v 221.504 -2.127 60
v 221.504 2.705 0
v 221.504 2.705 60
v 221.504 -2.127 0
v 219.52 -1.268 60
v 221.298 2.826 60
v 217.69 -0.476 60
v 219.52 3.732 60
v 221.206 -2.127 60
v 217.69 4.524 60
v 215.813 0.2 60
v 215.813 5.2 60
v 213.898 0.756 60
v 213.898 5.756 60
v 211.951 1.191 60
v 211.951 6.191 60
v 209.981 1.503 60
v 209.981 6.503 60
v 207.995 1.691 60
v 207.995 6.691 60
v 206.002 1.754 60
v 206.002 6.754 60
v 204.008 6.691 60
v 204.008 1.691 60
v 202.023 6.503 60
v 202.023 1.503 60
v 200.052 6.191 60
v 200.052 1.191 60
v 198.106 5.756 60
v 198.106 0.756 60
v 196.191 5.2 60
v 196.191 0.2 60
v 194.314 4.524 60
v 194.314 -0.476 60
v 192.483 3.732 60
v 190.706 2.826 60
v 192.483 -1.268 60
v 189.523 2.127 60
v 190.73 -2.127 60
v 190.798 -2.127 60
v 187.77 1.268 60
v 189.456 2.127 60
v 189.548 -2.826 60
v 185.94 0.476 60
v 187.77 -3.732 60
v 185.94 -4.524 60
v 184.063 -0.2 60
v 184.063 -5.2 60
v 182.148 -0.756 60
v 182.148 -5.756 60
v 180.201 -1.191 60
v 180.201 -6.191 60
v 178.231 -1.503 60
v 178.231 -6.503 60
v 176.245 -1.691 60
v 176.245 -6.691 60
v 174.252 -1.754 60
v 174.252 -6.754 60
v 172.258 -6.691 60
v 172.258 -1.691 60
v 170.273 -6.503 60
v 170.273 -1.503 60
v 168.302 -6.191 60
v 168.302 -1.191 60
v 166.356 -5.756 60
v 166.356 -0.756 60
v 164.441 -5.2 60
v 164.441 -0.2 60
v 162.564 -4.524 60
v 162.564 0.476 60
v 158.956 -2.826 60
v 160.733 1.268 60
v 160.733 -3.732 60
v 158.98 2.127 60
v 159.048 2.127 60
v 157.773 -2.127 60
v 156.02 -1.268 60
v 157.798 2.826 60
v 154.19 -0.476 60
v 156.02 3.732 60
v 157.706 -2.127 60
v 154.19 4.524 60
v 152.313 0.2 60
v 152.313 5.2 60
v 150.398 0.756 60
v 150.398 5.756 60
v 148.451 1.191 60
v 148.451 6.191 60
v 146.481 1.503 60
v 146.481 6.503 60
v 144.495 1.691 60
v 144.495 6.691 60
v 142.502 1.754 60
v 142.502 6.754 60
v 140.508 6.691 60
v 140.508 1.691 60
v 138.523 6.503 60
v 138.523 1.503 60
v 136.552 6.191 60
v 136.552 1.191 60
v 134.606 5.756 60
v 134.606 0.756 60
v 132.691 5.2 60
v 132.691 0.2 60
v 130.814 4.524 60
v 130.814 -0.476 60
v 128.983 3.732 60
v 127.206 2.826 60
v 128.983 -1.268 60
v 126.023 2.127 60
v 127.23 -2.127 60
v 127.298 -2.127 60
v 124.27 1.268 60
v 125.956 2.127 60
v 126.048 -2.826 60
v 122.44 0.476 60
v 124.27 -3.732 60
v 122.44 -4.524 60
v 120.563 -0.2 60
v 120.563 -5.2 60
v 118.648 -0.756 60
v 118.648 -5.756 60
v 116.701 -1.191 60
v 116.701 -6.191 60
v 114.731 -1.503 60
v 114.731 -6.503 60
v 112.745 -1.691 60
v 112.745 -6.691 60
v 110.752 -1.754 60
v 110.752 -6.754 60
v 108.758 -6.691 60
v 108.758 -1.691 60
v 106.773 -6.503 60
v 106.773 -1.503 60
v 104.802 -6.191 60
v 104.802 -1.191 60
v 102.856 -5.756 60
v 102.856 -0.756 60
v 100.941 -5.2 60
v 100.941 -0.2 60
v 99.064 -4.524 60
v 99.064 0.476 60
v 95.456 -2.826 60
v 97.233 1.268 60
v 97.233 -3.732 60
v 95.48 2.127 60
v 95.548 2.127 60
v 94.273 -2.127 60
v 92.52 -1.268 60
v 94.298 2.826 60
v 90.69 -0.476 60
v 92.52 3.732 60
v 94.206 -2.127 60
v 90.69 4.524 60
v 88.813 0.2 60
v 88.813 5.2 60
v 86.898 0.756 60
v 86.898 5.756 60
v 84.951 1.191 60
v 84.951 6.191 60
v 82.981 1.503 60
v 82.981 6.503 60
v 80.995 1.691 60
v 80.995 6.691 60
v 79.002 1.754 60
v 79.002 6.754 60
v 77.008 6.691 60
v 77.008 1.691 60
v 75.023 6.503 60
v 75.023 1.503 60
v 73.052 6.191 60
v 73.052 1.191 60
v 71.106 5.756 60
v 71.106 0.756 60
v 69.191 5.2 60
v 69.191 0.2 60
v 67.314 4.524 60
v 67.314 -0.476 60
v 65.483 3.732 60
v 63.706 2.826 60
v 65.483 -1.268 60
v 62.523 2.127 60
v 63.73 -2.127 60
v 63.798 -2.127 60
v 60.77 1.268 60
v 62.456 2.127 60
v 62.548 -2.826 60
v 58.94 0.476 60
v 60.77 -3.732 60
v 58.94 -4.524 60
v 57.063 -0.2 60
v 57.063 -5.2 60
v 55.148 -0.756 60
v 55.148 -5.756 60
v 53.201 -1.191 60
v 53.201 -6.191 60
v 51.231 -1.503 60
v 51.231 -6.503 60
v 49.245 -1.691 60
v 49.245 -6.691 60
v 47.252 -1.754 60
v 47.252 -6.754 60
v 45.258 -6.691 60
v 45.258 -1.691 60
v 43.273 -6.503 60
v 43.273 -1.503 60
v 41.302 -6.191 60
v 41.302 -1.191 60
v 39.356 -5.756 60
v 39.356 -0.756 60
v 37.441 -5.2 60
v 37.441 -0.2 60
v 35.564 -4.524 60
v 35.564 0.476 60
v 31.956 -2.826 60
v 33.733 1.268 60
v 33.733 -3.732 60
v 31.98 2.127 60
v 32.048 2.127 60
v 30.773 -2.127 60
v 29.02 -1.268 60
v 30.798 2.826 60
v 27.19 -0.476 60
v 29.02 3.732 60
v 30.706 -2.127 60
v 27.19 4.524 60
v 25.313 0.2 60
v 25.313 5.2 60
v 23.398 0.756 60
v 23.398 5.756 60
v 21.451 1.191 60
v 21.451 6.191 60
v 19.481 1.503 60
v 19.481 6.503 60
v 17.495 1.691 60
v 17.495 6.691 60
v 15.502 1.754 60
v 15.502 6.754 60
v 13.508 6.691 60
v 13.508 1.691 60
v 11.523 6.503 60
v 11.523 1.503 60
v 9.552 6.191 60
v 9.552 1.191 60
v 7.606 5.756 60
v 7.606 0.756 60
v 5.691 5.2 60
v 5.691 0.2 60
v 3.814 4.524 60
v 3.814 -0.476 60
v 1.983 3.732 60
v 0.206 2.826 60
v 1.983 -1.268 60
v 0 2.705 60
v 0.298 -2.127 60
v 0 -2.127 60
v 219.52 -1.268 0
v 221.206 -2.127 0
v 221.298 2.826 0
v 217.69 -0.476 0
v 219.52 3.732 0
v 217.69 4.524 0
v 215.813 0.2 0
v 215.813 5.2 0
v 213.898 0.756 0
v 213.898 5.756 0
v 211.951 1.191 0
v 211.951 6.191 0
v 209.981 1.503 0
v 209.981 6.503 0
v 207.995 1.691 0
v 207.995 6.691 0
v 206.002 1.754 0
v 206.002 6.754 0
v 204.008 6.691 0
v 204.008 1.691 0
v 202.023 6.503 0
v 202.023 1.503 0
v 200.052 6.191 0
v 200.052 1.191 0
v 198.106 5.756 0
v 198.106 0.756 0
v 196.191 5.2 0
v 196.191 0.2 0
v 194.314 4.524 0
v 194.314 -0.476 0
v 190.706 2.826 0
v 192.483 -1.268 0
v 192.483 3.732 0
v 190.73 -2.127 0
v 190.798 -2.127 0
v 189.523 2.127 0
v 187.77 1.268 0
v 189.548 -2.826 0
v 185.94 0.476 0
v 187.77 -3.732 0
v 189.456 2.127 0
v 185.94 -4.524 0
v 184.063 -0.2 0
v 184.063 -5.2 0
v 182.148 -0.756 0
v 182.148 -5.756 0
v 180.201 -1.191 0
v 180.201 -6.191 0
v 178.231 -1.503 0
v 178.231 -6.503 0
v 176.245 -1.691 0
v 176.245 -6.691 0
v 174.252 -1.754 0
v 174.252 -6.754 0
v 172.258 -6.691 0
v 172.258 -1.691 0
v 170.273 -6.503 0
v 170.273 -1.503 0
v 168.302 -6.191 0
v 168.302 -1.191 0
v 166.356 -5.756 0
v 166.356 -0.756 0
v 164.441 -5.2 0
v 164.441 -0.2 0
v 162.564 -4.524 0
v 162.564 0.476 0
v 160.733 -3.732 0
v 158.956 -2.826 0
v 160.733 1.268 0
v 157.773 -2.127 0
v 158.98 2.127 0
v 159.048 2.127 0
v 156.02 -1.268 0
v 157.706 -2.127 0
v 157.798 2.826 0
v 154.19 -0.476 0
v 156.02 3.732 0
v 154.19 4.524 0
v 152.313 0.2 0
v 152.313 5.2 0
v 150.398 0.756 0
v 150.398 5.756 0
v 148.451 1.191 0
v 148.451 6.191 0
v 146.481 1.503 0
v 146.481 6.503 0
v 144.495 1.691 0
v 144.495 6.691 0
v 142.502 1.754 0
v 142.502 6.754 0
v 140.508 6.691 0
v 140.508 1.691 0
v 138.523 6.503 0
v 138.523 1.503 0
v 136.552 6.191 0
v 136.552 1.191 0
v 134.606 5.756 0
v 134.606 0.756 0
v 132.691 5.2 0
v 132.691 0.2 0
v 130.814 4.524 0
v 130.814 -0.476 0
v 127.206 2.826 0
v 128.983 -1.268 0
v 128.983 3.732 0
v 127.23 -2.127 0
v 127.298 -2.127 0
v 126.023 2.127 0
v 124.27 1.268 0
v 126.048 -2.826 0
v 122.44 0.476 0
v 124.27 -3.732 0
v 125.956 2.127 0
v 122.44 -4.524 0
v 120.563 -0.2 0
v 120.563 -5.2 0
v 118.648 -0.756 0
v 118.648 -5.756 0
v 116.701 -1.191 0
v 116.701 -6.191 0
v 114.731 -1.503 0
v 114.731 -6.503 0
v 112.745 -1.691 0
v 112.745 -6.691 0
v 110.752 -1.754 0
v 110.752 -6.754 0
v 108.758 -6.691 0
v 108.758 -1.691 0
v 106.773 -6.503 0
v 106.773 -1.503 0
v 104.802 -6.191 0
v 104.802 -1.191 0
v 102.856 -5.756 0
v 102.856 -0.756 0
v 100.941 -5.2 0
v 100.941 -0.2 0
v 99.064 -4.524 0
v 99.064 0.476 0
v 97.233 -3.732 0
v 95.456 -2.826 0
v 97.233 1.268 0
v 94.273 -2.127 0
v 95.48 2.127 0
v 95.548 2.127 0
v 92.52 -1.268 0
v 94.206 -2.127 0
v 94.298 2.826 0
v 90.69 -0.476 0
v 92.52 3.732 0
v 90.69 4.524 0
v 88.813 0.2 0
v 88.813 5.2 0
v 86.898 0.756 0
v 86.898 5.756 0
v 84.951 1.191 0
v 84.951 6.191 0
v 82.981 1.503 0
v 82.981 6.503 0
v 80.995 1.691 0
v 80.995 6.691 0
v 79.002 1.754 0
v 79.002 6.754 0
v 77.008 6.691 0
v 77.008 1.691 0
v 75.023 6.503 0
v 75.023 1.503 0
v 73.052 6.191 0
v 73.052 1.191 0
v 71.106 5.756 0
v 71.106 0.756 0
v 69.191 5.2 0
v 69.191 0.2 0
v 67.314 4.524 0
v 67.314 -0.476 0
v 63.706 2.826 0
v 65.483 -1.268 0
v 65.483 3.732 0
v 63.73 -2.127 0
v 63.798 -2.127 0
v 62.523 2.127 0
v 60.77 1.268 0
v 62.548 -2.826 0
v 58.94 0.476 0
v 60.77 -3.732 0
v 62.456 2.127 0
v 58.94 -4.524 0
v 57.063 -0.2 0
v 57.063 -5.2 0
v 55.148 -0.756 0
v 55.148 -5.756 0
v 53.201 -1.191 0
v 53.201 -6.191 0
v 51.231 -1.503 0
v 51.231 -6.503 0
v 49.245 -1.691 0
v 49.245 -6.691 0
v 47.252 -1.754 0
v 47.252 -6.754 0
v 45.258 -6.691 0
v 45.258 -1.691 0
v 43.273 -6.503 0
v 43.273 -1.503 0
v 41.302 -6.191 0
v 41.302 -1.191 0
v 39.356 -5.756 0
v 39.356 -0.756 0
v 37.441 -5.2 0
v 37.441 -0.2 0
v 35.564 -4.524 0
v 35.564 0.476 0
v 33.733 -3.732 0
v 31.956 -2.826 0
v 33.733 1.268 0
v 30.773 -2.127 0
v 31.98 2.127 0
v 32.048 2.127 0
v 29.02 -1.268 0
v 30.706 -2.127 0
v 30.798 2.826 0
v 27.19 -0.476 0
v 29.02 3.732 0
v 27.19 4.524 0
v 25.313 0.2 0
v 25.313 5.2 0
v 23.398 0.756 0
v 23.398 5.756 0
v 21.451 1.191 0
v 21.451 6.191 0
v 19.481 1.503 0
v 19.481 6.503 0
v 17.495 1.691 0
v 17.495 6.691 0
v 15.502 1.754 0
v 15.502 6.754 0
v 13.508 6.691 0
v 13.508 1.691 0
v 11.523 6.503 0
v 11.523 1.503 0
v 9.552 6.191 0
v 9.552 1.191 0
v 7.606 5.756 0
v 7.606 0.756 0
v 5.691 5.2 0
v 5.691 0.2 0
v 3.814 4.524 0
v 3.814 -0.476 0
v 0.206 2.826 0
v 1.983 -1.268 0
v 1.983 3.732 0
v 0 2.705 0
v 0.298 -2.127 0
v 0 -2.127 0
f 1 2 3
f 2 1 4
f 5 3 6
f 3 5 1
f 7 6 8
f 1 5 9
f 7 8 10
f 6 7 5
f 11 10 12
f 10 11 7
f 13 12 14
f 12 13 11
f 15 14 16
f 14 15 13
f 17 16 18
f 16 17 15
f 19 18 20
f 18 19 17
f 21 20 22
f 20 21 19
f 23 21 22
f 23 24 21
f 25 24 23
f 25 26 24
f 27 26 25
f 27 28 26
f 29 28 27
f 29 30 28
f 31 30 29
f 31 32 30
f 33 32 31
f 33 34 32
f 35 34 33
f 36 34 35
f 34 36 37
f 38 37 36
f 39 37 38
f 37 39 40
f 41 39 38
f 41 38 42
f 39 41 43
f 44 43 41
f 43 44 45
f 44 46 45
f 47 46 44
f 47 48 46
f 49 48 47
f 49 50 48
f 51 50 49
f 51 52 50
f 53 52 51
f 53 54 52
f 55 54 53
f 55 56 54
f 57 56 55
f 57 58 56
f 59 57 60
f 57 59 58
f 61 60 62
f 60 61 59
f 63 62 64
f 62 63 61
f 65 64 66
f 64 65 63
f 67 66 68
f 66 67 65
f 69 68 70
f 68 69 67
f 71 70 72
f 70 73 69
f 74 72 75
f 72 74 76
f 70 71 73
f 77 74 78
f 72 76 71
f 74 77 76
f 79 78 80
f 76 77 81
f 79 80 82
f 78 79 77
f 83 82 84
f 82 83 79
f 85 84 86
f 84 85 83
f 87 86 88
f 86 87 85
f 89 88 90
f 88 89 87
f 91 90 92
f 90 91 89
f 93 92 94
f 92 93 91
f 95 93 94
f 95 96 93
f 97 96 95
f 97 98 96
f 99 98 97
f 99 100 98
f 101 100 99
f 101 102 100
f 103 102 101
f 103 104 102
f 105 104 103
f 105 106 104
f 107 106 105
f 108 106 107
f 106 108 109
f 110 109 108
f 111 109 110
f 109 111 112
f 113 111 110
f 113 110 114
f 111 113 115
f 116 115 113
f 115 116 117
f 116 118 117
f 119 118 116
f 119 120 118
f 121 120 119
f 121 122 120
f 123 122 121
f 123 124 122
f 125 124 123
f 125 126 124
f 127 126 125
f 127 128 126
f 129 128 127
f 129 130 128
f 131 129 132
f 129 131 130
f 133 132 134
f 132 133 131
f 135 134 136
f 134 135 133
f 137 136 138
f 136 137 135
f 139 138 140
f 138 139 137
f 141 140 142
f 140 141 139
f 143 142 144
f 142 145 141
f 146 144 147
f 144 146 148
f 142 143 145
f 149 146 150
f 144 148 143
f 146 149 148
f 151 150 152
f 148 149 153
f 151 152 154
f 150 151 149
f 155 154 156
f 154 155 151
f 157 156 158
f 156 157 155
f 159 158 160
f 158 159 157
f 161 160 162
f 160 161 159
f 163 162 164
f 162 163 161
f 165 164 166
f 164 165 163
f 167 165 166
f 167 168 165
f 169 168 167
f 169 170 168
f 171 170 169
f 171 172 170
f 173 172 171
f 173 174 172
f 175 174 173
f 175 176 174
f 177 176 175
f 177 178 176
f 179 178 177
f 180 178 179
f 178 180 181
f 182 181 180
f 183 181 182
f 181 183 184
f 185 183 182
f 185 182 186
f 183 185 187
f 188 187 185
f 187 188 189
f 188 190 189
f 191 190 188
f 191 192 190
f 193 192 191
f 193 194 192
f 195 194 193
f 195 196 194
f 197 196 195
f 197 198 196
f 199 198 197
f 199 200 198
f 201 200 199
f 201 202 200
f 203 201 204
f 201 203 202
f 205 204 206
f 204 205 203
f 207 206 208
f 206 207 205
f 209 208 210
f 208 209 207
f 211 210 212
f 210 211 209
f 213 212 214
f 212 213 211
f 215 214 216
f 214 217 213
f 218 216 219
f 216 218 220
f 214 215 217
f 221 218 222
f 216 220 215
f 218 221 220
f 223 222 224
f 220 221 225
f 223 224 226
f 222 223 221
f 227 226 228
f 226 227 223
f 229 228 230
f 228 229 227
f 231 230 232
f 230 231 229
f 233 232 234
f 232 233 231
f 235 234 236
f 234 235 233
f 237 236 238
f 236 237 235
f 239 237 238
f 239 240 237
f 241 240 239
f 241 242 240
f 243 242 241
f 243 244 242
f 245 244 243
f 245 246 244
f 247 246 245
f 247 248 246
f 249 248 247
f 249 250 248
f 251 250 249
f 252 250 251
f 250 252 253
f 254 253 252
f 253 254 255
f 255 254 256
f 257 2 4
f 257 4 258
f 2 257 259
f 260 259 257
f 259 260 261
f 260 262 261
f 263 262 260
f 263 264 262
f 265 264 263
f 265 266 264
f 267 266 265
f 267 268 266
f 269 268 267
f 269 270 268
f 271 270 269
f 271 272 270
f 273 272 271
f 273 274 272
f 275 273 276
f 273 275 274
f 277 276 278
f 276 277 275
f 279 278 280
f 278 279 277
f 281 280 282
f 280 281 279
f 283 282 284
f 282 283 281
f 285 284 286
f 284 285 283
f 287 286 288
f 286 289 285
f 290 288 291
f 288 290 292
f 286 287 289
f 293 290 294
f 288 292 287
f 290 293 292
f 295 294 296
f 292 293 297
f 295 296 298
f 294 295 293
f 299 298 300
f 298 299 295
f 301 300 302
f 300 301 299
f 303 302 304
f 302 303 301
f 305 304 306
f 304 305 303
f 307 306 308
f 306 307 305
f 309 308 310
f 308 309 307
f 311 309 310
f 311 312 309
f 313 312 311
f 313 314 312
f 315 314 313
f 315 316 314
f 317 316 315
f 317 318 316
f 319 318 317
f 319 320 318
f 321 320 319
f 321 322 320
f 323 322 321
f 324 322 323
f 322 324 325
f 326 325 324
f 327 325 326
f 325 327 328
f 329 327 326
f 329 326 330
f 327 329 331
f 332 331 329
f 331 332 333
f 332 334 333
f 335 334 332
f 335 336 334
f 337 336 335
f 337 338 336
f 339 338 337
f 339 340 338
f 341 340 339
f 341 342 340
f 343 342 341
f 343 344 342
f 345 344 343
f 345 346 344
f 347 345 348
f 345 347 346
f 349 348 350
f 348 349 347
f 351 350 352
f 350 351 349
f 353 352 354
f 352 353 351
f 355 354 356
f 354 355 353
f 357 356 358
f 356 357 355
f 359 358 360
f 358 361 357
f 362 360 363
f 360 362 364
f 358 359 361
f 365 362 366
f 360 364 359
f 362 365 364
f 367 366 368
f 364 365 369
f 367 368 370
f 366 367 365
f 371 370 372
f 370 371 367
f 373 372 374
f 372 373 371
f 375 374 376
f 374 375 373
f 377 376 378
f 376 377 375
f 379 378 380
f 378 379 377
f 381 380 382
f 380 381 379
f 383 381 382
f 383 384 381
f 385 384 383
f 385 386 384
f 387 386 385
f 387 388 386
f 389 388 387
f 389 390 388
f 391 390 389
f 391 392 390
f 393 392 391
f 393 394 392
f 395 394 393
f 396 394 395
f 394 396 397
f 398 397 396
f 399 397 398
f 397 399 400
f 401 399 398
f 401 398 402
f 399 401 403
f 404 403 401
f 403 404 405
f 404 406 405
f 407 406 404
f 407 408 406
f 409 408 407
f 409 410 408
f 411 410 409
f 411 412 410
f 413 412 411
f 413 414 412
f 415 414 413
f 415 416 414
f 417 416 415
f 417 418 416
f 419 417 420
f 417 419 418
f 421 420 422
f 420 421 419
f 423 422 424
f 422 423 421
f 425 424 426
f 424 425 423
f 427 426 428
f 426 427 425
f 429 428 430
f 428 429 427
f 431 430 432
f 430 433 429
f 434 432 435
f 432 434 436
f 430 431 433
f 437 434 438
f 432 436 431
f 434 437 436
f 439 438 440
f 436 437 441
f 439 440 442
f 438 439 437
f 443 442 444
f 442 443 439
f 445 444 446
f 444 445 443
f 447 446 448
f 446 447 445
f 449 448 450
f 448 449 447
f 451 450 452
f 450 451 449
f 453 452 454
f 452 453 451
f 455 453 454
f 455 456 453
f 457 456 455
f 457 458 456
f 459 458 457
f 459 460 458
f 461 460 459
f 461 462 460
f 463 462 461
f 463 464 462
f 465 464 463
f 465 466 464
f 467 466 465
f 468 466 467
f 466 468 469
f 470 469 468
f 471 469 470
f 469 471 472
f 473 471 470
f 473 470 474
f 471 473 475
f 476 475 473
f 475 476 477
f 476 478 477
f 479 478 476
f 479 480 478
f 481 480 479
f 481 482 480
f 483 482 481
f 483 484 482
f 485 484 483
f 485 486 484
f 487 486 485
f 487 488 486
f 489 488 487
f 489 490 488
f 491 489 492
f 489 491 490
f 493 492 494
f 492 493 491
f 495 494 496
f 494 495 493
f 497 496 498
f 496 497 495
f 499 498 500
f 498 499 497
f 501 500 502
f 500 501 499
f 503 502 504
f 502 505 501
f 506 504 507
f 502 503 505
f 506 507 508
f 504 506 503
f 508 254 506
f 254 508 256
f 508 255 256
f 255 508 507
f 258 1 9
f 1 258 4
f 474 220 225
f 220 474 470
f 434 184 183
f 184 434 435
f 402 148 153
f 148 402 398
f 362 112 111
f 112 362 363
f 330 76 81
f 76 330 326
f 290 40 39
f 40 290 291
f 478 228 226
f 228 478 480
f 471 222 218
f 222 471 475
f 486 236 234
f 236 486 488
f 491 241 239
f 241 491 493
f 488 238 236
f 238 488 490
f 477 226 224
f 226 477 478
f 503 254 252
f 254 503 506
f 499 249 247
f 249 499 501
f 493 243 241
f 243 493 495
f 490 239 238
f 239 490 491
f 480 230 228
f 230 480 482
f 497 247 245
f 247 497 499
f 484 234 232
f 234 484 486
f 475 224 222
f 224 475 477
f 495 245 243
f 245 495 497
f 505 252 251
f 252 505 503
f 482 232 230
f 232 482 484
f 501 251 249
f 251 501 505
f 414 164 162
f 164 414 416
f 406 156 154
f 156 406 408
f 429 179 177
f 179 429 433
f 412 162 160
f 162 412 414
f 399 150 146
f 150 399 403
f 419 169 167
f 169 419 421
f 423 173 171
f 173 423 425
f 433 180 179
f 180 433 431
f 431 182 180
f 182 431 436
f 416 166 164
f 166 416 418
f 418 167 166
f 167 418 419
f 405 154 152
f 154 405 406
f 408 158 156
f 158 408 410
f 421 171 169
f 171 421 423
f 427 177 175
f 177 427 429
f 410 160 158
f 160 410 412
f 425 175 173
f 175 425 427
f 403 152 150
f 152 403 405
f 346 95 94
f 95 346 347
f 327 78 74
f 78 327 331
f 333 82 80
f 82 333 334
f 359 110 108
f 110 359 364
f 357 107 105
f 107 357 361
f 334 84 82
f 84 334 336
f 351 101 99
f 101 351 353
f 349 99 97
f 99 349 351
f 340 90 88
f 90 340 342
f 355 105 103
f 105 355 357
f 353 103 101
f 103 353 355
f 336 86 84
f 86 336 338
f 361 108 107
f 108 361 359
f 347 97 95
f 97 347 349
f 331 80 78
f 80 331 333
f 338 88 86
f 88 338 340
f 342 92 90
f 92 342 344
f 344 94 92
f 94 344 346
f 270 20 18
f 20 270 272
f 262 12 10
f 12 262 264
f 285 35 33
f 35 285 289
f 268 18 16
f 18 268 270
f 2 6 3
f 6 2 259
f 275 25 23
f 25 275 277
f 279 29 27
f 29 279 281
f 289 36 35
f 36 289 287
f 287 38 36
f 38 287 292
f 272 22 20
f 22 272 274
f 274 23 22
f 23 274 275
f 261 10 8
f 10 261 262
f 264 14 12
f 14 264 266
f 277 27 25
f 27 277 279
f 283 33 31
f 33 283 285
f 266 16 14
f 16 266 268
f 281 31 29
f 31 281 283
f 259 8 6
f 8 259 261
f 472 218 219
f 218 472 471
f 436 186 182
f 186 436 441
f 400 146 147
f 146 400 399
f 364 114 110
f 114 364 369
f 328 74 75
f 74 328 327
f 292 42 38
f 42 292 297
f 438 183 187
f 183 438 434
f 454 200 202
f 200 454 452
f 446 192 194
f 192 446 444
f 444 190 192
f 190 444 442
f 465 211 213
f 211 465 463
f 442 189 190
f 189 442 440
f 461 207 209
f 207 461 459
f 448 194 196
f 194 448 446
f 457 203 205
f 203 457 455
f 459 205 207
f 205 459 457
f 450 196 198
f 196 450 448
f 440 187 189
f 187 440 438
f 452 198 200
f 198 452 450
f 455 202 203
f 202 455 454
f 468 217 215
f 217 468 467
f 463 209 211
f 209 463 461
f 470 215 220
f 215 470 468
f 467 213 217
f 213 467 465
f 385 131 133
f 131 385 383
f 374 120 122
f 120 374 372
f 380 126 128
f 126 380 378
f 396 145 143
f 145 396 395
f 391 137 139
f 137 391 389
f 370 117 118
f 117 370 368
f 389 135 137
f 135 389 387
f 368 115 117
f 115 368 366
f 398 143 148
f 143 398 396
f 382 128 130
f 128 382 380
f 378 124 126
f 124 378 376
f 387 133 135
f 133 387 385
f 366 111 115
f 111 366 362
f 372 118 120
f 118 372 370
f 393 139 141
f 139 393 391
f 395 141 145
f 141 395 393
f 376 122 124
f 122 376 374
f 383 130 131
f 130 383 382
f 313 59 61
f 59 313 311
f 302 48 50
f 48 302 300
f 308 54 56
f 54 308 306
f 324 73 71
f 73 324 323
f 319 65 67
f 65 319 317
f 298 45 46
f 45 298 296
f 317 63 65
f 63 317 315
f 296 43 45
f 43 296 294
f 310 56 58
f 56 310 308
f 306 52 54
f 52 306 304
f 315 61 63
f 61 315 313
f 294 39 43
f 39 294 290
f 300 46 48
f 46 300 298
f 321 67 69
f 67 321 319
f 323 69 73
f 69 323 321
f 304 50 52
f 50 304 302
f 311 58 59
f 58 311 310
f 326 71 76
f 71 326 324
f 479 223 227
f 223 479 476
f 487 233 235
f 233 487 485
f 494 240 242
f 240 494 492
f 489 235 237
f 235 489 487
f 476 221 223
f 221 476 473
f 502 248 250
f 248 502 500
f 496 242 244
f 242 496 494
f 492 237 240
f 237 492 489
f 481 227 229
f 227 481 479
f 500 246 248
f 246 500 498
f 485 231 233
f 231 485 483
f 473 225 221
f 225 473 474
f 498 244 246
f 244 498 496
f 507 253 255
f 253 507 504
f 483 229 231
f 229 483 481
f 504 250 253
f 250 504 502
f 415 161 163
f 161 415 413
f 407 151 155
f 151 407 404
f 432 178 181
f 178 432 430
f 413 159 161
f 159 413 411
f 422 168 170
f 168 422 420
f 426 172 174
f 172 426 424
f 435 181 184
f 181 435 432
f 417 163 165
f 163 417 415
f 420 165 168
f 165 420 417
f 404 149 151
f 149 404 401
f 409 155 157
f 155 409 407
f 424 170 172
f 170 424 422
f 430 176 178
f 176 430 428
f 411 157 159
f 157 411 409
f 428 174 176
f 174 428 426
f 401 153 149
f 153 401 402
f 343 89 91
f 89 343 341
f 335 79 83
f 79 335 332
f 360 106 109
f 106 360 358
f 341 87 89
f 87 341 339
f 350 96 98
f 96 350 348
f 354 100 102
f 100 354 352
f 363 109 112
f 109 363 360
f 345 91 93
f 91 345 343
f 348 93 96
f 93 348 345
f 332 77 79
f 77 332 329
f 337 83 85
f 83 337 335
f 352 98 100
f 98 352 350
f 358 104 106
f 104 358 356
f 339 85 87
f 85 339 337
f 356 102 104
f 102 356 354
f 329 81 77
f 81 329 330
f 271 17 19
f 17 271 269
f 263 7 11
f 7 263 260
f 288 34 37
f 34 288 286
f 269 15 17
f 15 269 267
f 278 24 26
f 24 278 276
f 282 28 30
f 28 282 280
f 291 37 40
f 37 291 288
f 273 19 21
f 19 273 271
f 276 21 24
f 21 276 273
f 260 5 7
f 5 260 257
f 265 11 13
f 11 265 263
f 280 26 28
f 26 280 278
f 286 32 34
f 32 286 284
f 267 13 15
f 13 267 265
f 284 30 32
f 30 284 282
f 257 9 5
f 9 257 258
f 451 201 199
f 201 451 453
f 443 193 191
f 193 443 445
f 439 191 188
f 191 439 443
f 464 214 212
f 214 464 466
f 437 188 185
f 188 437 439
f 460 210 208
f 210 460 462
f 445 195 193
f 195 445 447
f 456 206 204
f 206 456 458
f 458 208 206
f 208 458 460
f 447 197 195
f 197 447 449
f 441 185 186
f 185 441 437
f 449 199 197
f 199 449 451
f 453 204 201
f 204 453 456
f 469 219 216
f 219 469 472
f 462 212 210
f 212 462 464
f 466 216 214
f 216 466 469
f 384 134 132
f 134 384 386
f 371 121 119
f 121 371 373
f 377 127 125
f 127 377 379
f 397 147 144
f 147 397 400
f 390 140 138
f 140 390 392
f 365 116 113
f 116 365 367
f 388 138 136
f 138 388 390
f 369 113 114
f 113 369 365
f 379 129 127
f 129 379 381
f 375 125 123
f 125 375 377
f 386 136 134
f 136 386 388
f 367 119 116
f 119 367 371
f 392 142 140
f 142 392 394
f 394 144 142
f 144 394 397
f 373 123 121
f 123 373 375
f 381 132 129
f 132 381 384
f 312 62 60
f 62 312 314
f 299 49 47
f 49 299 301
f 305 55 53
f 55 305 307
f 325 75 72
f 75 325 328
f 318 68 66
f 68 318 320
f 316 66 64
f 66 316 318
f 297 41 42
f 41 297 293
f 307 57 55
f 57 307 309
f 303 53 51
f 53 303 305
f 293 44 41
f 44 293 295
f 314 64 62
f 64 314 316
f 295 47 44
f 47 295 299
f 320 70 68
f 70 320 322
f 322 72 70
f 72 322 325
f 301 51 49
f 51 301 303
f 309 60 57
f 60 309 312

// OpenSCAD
//Config values
/* [Layout] */
//How many cans fit on the bottom row
NumberOfCansOnBottom = 4;
//How thick should it be between the cans (in mm)
DividerThickness = 5;
//How deep should it be along the height of the can (in mm)
DividerDepth = 60;  //Full can height is 121.92


BetweenCanShape = 1; //[0:square edges, 1:smooth curve, 2:faceted curve]


/* [Details] */
//Some other can size? (in mm)
CanRadius = 31.75;





//######## Between Can Options
//VERSION0 is flat surfaces
VERSION0 = BetweenCanShape == 0;
//VERSION1 is smooth curves, same size as cans
VERSION1 = BetweenCanShape == 1;
//VERSION2 is faceted curves, same size as cans, see facetCurveCount to adjust
VERSION2 = BetweenCanShape == 2;
//#####End Between Can Options


//Height of square edges option
SquareEdgesHeight = 10;

//THESE OPTIONS WORK PRETTY WELL
//Faceted curve number
facetCurveCount = 18; //[10, 12, 18, 24]


//######## End Options

//Version 0 has edges that extend past the can
//Version 1 has edges that touch the can
ENDS_VERSION = 1;  //[0:extend past can, 1:edges stop at can]]
//#####End End Options


//###### applying option calculations
retainThickness = VERSION0 ? SquareEdgesHeight/2 : DividerThickness/2;
moveShitOver = [
			//Version 0:
			0,
			//Verison 1:
			VERSION0
				?	CanRadius-sqrt(((CanRadius-retainThickness)*(CanRadius-retainThickness))
					+(CanRadius*CanRadius))
				: -CanRadius * sin(60) / 2 - retainThickness
			];
width = NumberOfCansOnBottom * CanRadius * 2
				+ moveShitOver[ENDS_VERSION]*2;


/* [Smoothness] */
$fn = 100;
/* [Hidden] */
OVERLAP=0.1;

////Setup
//canCenters = [for (i = [0:NumberOfCansOnBottom])
//{
//	
//}
//];


CombineAll();

module CombineAll()
{
	difference()
	{
		//Positive
		union()
		{
			if (VERSION0) {
				MainPiece(SquareEdgesHeight);
			}


			if (VERSION1) {
				assign (offset = CanRadius * sin(60) / 2)
				{
				intersection()
				{
					translate(v=[0, offset, 0])
						MainPiece(CanRadius);
					AllCanShapes(-DividerThickness, bottom = false, overlap = false);
				}
				intersection()
				{
					translate(v=[0, -offset, 0])
						MainPiece(CanRadius);
					AllCanShapes(-DividerThickness, top = false, overlap = false);
				}
				}
			}


			if (VERSION2) {
				assign (offset = CanRadius * sin(60) / 2)
				intersection()
				{
					translate(v=[0, offset, 0])
						MainPiece(CanRadius);
					AllCanShapes(-DividerThickness, bottom = false, overlap = false, $fn = facetCurveCount);
				}
				intersection()
				{
					translate(v=[0, -offset, 0])
						MainPiece(CanRadius);
					AllCanShapes(-DividerThickness, top = false, overlap = false, $fn = facetCurveCount);
				}
			}
		}
		
		//Negative
		union()
		{
			AllCanShapes(DividerThickness);
		}
	}
}

module AllCanShapes(thicknessToRetain, bottom = true, top = true, overlap = true)
{
	translate(v = [moveShitOver[ENDS_VERSION], 0, 0])
		AllCanShapes_Version0(thicknessToRetain, bottom, top, overlap = overlap);
}
module AllCanShapes_Version0(thicknessToRetain, bottom = true, top = true, overlap = true)
{
	retain = thicknessToRetain/2;

	if (top)
		CanShapes([CanRadius, -CanRadius * sin(60) - retain, 0], NumberOfCansOnBottom, overlap = overlap);
	if (bottom)
		CanShapes([CanRadius*2, CanRadius * sin(60) + retain, 0], NumberOfCansOnBottom-1, overlap = overlap);
}


module MainPiece(height)
{
	difference()
	{
		//Positive
		union()
		{
			translate(v=[0, -height/2, 0])
				cube(size = [width, height, DividerDepth]);
		}
		
		//Negative
		union()
		{
		}
	}
}

module CanShapes(v, number, overlap = true)
{
	difference()
	{
		//Positive
		union()
		{
			translate(v=v){
				for (i = [0:number-1]) {
					translate(v=[i*2*CanRadius, 0, overlap ? -OVERLAP : 0])
						cylinder(h=DividerDepth + (overlap ? 2*OVERLAP : 0), r=CanRadius);
				}
			}
		}
		
		//Negative
		union()
		{
		}
	}
}
